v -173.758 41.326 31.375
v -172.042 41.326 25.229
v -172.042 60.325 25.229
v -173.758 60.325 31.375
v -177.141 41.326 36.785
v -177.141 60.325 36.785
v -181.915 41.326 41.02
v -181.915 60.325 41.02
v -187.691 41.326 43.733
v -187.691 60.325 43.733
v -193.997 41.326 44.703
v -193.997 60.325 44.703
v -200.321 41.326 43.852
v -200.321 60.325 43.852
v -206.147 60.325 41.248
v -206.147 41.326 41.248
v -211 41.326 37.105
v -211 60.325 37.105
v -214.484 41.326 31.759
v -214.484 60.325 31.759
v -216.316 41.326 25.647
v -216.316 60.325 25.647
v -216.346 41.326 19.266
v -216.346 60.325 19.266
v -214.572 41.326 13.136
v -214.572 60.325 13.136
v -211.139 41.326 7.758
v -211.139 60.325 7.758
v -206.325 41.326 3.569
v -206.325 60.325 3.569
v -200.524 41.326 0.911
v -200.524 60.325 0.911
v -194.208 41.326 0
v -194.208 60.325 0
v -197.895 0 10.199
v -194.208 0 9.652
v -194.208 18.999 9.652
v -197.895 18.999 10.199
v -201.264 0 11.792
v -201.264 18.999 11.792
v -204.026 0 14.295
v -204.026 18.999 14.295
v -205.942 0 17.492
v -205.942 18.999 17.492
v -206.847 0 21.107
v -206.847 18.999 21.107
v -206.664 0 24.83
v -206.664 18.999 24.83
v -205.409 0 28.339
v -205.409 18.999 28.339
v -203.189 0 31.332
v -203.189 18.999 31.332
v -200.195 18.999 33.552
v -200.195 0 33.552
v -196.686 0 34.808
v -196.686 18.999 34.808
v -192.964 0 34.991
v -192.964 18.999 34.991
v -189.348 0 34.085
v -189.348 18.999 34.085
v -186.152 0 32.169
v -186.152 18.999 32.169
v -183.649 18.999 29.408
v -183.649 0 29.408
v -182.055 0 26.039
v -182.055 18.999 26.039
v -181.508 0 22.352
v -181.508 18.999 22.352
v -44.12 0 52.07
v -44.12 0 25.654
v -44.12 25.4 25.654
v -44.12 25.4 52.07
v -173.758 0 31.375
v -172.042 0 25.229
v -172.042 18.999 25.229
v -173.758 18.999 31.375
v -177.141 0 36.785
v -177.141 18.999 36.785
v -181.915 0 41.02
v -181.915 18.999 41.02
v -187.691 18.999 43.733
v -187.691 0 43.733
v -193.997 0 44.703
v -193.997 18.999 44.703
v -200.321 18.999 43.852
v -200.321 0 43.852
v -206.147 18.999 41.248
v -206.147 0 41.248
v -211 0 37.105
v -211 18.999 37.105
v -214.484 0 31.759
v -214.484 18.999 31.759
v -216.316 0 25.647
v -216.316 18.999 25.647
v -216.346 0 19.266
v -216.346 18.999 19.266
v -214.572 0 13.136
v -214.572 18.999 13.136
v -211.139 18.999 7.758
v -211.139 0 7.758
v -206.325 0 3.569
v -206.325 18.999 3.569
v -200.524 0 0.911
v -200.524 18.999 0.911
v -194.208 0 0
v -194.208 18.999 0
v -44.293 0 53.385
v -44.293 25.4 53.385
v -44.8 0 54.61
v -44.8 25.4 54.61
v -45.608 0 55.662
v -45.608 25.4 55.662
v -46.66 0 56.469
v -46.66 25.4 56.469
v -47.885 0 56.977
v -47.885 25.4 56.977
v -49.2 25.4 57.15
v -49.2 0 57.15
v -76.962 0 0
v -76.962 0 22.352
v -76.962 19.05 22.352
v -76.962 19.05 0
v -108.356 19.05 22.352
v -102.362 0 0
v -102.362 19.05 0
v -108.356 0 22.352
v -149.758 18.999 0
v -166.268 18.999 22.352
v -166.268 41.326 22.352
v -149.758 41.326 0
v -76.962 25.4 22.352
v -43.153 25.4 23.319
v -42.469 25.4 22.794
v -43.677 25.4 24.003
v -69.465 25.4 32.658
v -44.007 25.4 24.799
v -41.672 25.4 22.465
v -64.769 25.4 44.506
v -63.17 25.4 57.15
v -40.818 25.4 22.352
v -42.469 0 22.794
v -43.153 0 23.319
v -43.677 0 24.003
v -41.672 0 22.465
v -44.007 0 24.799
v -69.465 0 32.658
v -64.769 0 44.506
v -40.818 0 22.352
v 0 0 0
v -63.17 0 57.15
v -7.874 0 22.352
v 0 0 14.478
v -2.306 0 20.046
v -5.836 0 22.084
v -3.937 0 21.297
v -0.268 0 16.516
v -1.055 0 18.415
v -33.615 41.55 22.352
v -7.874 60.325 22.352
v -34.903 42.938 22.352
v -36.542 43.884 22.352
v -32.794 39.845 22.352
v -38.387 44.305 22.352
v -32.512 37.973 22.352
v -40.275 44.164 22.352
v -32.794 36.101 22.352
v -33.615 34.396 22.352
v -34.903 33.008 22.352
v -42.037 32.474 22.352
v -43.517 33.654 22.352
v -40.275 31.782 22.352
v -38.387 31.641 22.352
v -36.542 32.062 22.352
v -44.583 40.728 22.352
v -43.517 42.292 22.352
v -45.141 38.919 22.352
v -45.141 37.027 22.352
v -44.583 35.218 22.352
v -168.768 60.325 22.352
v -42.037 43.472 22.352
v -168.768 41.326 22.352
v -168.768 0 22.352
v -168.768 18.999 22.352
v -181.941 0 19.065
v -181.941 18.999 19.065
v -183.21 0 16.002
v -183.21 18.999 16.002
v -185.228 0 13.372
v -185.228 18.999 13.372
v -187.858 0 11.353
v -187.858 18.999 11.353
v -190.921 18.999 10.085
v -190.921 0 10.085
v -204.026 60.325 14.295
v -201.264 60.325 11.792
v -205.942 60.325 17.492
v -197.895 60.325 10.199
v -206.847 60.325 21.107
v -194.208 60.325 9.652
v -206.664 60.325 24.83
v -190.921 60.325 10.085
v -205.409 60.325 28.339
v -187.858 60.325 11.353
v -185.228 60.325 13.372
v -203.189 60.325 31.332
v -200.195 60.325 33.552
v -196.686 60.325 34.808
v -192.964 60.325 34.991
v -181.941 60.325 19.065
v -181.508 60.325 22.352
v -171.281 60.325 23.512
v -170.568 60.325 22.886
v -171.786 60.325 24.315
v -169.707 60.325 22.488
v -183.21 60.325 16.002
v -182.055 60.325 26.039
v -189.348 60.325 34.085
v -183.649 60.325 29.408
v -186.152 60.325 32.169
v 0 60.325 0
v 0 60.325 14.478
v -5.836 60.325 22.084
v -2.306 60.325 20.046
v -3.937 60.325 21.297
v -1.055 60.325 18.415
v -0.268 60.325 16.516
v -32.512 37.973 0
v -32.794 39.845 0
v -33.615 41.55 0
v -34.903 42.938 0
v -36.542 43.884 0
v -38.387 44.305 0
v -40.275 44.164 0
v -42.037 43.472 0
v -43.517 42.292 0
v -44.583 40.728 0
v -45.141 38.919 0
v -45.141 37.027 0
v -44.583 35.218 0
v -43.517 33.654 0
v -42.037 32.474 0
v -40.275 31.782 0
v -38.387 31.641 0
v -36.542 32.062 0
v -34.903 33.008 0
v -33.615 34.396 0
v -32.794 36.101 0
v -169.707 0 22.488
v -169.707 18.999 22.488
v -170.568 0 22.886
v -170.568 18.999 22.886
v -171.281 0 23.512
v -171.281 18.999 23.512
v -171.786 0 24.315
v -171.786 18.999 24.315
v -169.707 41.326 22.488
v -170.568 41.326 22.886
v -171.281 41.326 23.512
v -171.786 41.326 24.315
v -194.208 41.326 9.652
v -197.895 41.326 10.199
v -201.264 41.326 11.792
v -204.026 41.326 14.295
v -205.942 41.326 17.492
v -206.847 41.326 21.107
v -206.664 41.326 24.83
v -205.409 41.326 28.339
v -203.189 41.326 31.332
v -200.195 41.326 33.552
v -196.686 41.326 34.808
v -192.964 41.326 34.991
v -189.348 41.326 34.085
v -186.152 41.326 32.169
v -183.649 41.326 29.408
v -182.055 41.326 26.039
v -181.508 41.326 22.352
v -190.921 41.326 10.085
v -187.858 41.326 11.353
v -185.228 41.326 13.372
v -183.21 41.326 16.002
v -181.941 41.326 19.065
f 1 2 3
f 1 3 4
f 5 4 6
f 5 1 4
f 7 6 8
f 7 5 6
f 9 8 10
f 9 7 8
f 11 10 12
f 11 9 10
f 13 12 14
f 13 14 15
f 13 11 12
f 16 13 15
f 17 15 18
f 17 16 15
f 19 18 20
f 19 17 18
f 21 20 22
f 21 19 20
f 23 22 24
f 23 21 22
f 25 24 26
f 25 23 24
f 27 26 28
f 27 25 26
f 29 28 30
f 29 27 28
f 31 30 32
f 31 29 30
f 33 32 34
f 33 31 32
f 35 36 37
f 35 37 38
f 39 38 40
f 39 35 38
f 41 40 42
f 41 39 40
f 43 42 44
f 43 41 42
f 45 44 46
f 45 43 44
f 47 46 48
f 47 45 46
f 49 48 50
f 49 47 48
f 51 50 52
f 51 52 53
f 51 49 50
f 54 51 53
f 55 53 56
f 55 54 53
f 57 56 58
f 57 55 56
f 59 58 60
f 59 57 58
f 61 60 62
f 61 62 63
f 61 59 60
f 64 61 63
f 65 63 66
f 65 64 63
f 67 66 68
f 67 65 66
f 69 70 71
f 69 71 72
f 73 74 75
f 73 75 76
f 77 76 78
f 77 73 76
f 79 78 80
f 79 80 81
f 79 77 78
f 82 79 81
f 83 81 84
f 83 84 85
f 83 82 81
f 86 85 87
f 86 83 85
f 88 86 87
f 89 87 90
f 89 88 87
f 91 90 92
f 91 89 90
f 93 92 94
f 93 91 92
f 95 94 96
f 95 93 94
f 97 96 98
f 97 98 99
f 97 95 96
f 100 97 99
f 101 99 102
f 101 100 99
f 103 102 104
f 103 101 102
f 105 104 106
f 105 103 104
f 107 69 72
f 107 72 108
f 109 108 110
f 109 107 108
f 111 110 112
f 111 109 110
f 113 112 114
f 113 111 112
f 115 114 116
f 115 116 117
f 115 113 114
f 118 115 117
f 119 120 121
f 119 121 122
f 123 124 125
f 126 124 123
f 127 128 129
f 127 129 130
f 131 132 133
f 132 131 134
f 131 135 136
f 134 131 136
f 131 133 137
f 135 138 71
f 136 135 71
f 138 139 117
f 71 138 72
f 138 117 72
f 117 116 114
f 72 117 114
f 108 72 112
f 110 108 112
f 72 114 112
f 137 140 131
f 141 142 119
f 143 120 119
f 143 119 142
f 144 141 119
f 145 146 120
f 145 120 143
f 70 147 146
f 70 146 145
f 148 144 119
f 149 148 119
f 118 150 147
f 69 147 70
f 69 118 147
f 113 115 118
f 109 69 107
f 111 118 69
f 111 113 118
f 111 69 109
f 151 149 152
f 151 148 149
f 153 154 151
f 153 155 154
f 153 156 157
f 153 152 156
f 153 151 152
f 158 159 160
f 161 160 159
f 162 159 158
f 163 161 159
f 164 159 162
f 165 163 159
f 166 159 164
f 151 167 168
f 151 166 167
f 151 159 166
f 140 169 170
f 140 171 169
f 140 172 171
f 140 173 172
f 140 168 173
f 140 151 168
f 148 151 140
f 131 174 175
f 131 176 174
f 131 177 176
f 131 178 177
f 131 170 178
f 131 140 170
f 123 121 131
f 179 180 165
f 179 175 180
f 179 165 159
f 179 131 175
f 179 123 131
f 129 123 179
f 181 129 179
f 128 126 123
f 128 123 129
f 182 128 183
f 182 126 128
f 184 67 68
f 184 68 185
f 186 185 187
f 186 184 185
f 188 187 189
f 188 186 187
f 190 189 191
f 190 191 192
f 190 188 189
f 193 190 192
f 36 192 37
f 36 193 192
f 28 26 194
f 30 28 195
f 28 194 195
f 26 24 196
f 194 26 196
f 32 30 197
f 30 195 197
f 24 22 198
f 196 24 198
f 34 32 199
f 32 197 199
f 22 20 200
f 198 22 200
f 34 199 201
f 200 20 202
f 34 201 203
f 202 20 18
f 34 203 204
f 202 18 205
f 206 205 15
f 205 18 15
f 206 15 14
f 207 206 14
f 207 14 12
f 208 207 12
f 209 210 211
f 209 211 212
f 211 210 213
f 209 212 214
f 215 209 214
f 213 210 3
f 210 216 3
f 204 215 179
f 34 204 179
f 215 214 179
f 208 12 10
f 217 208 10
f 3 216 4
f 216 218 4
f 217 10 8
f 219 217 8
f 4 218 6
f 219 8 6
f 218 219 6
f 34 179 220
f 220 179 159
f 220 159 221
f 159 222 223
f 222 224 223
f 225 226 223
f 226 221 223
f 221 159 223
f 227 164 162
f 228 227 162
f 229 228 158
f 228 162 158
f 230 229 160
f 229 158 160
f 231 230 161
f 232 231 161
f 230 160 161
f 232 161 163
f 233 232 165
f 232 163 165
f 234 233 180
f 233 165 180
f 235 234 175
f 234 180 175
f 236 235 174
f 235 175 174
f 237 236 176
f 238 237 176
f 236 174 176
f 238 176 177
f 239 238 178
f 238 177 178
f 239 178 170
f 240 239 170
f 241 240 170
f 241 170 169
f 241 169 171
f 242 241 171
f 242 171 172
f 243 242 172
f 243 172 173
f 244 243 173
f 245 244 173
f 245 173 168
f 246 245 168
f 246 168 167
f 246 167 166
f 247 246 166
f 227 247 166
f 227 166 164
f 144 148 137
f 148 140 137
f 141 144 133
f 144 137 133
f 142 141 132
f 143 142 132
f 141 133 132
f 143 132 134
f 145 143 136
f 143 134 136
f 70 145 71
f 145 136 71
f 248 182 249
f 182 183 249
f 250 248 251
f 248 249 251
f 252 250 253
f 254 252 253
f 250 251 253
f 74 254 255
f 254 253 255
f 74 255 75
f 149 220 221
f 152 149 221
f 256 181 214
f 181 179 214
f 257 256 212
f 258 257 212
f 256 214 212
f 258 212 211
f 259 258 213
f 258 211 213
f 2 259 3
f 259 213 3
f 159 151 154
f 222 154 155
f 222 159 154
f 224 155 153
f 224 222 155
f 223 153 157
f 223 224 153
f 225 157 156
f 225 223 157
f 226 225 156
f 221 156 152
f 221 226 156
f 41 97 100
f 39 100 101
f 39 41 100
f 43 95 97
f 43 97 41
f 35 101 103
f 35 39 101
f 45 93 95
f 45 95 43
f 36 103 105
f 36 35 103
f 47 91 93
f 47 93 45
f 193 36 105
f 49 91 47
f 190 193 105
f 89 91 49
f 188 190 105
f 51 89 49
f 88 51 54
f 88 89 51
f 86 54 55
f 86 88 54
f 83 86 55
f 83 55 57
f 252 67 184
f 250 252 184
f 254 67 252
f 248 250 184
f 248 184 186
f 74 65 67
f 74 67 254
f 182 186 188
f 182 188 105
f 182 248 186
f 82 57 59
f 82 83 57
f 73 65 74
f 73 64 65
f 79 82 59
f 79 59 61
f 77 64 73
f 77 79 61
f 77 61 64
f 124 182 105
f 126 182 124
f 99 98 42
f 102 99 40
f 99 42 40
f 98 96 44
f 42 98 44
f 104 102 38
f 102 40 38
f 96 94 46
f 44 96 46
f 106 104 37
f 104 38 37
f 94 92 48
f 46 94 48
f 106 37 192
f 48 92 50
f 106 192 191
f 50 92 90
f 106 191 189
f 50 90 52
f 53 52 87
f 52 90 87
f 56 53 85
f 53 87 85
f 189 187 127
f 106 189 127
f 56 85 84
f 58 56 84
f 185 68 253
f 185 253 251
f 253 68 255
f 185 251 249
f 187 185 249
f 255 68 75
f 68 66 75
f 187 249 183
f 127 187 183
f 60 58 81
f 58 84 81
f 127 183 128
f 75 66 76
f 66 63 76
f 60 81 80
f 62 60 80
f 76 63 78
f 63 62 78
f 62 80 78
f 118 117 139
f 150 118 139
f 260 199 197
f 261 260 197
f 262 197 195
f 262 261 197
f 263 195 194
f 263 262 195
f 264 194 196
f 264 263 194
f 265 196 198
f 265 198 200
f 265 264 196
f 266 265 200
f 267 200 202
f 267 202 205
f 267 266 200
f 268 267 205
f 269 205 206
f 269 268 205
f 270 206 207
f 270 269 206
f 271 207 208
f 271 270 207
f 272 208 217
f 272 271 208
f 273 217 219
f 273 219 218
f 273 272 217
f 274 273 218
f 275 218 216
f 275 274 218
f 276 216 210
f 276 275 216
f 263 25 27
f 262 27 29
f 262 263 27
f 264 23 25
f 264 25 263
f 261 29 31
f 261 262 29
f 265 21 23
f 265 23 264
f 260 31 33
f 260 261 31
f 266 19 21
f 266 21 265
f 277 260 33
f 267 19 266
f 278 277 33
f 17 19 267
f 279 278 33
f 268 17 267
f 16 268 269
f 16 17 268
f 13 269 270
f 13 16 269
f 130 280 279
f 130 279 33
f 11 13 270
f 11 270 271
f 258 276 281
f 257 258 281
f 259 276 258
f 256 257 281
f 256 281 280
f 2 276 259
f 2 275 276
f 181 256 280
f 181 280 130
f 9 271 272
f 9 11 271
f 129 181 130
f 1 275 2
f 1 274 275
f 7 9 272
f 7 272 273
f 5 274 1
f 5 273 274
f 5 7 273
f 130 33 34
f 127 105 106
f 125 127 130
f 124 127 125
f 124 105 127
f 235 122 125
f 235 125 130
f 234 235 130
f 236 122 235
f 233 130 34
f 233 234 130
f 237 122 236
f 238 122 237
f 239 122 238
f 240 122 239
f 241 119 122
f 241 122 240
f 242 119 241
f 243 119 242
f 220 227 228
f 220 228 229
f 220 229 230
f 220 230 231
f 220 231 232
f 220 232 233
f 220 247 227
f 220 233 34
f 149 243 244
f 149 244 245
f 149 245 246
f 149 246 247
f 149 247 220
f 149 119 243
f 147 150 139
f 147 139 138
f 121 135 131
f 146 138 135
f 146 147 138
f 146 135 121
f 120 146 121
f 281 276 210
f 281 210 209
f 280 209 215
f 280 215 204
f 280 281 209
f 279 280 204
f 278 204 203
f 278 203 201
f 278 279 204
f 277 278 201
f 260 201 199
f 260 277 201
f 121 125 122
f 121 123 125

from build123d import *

# Parameters (mm, degrees)
F1_DEPTH  = 18.9992
F2_START  = -41.3258
F2_DEPTH  = 18.9992
F3_DEPTH  = 60.325
F4_DEPTH  = 60.325
F5_START  = -19.05
F5_DEPTH  = 41.275
F6_DEPTH  = 25.4
F7_R      = 3.302
F8_R      = 7.874
F9_R      = 6.35
F10_DEPTH = 22.353


with BuildPart() as f1:
    # F0 (on Front) → F1 (new body)
    with BuildSketch(Plane.XZ):
        with BuildLine():
            ThreePointArc((-171.8564, 22.352), (-210.0136507731, 38.1572507731), (-194.2084, 0))
            Line((-194.2084, 0), (-194.2084, 9.652))
            ThreePointArc((-194.2084, 9.652), (-203.1886561211, 31.3322561211), (-181.5084, 22.352))
            Line((-181.5084, 22.352), (-171.8564, 22.352))
        make_face()
        with BuildLine():
            Line((-194.2084, 9.652), (-194.2084, 0))
            ThreePointArc((-194.2084, 0), (-178.4031492269, 6.5467492269), (-171.8564, 22.352))
            Line((-171.8564, 22.352), (-181.5084, 22.352))
            ThreePointArc((-181.5084, 22.352), (-185.2281438789, 13.3717438789), (-194.2084, 9.652))
        make_face()
        with BuildLine():
            Line((-194.2084, 0), (-149.7584, 0))
            Line((-149.7584, 0), (-166.2684, 22.352))
            Line((-166.2684, 22.352), (-171.8564, 22.352))
            ThreePointArc((-171.8564, 22.352), (-178.4031492269, 6.5467492269), (-194.2084, 0))
        make_face()
        Polygon((-149.7584, 0), (-102.362, 0), (-108.3564, 22.352), (-166.2684, 22.352), align=None)
    extrude(amount=-F1_DEPTH)



with BuildPart() as f2:
    # F0 (on Front) → F2 (new body)
    with BuildSketch(Plane.XZ.offset(F2_START)):
        with BuildLine():
            ThreePointArc((-171.8564, 22.352), (-210.0136507731, 38.1572507731), (-194.2084, 0))
            Line((-194.2084, 0), (-194.2084, 9.652))
            ThreePointArc((-194.2084, 9.652), (-203.1886561211, 31.3322561211), (-181.5084, 22.352))
            Line((-181.5084, 22.352), (-171.8564, 22.352))
        make_face()
        with BuildLine():
            Line((-194.2084, 0), (-149.7584, 0))
            Line((-149.7584, 0), (-166.2684, 22.352))
            Line((-166.2684, 22.352), (-171.8564, 22.352))
            ThreePointArc((-171.8564, 22.352), (-178.4031492269, 6.5467492269), (-194.2084, 0))
        make_face()
        with BuildLine():
            Line((-194.2084, 9.652), (-194.2084, 0))
            ThreePointArc((-194.2084, 0), (-178.4031492269, 6.5467492269), (-171.8564, 22.352))
            Line((-171.8564, 22.352), (-181.5084, 22.352))
            ThreePointArc((-181.5084, 22.352), (-185.2281438789, 13.3717438789), (-194.2084, 9.652))
        make_face()
        Polygon((-149.7584, 0), (-102.362, 0), (-108.3564, 22.352), (-166.2684, 22.352), align=None)
    extrude(amount=-F2_DEPTH)


with BuildPart() as f1_1:
    add(f1.part)

    add(f2.part)  # F3 merges F2
    # F0 (on Front) → F3 (join, through all)
    with BuildSketch(Plane.XZ):
        Polygon((-149.7584, 0), (-102.362, 0), (-108.3564, 22.352), (-166.2684, 22.352), align=None)
    extrude(amount=-F3_DEPTH)



with BuildPart() as f4:
    # F0 (on Front) → F4 (new body)
    with BuildSketch(Plane.XZ):
        Polygon((-76.962, 0), (0, 0), (0, 22.352), (-44.1198, 22.352), (-76.962, 22.352), align=None)
    extrude(amount=-F4_DEPTH)


with BuildPart() as f1_2:
    add(f1_1.part)

    add(f4.part)  # F5 merges F4
    # F0 (on Front) → F5 (join)
    with BuildSketch(Plane.XZ.offset(F5_START)):
        Polygon((-102.362, 0), (-76.962, 0), (-76.962, 22.352), (-108.3564, 22.352), align=None)
    extrude(amount=-F5_DEPTH)

    # F0 (on Front) → F6 (join)
    with BuildSketch(Plane.XZ):
        with BuildLine():
            ThreePointArc((-63.1698, 57.15), (-66.7439846384, 38.4343576341), (-76.962, 22.352))
            Line((-76.962, 22.352), (-44.1198, 22.352))
            Line((-44.1198, 22.352), (-44.1198, 52.07))
            ThreePointArc((-44.1198, 52.07), (-45.6076975516, 55.6621024484), (-49.1998, 57.15))
            Line((-49.1998, 57.15), (-63.1698, 57.15))
        make_face()
    extrude(amount=-F6_DEPTH)

    # F7
    f7_edges = [f1_2.edges().sort_by_distance(p)[0] for p in [
        (-44.1198, 12.7, 22.352),
        (-171.8564, 9.4996, 22.352),
        (-171.8564, 50.8254, 22.352),
    ]]
    fillet(f7_edges, radius=F7_R)

    # F8
    f8_edges = [f1_2.edges().sort_by_distance(p)[0] for p in [
        (0, 30.1625, 22.352),
    ]]
    fillet(f8_edges, radius=F8_R)

    # F9 (on face) → F10 (cut, through all)
    with BuildSketch(Plane.XY.offset(22.352)):
        with Locations((-38.862, 37.973)):
            Circle(F9_R)
    extrude(amount=-F10_DEPTH, mode=Mode.SUBTRACT)


solid = f1_2.part
